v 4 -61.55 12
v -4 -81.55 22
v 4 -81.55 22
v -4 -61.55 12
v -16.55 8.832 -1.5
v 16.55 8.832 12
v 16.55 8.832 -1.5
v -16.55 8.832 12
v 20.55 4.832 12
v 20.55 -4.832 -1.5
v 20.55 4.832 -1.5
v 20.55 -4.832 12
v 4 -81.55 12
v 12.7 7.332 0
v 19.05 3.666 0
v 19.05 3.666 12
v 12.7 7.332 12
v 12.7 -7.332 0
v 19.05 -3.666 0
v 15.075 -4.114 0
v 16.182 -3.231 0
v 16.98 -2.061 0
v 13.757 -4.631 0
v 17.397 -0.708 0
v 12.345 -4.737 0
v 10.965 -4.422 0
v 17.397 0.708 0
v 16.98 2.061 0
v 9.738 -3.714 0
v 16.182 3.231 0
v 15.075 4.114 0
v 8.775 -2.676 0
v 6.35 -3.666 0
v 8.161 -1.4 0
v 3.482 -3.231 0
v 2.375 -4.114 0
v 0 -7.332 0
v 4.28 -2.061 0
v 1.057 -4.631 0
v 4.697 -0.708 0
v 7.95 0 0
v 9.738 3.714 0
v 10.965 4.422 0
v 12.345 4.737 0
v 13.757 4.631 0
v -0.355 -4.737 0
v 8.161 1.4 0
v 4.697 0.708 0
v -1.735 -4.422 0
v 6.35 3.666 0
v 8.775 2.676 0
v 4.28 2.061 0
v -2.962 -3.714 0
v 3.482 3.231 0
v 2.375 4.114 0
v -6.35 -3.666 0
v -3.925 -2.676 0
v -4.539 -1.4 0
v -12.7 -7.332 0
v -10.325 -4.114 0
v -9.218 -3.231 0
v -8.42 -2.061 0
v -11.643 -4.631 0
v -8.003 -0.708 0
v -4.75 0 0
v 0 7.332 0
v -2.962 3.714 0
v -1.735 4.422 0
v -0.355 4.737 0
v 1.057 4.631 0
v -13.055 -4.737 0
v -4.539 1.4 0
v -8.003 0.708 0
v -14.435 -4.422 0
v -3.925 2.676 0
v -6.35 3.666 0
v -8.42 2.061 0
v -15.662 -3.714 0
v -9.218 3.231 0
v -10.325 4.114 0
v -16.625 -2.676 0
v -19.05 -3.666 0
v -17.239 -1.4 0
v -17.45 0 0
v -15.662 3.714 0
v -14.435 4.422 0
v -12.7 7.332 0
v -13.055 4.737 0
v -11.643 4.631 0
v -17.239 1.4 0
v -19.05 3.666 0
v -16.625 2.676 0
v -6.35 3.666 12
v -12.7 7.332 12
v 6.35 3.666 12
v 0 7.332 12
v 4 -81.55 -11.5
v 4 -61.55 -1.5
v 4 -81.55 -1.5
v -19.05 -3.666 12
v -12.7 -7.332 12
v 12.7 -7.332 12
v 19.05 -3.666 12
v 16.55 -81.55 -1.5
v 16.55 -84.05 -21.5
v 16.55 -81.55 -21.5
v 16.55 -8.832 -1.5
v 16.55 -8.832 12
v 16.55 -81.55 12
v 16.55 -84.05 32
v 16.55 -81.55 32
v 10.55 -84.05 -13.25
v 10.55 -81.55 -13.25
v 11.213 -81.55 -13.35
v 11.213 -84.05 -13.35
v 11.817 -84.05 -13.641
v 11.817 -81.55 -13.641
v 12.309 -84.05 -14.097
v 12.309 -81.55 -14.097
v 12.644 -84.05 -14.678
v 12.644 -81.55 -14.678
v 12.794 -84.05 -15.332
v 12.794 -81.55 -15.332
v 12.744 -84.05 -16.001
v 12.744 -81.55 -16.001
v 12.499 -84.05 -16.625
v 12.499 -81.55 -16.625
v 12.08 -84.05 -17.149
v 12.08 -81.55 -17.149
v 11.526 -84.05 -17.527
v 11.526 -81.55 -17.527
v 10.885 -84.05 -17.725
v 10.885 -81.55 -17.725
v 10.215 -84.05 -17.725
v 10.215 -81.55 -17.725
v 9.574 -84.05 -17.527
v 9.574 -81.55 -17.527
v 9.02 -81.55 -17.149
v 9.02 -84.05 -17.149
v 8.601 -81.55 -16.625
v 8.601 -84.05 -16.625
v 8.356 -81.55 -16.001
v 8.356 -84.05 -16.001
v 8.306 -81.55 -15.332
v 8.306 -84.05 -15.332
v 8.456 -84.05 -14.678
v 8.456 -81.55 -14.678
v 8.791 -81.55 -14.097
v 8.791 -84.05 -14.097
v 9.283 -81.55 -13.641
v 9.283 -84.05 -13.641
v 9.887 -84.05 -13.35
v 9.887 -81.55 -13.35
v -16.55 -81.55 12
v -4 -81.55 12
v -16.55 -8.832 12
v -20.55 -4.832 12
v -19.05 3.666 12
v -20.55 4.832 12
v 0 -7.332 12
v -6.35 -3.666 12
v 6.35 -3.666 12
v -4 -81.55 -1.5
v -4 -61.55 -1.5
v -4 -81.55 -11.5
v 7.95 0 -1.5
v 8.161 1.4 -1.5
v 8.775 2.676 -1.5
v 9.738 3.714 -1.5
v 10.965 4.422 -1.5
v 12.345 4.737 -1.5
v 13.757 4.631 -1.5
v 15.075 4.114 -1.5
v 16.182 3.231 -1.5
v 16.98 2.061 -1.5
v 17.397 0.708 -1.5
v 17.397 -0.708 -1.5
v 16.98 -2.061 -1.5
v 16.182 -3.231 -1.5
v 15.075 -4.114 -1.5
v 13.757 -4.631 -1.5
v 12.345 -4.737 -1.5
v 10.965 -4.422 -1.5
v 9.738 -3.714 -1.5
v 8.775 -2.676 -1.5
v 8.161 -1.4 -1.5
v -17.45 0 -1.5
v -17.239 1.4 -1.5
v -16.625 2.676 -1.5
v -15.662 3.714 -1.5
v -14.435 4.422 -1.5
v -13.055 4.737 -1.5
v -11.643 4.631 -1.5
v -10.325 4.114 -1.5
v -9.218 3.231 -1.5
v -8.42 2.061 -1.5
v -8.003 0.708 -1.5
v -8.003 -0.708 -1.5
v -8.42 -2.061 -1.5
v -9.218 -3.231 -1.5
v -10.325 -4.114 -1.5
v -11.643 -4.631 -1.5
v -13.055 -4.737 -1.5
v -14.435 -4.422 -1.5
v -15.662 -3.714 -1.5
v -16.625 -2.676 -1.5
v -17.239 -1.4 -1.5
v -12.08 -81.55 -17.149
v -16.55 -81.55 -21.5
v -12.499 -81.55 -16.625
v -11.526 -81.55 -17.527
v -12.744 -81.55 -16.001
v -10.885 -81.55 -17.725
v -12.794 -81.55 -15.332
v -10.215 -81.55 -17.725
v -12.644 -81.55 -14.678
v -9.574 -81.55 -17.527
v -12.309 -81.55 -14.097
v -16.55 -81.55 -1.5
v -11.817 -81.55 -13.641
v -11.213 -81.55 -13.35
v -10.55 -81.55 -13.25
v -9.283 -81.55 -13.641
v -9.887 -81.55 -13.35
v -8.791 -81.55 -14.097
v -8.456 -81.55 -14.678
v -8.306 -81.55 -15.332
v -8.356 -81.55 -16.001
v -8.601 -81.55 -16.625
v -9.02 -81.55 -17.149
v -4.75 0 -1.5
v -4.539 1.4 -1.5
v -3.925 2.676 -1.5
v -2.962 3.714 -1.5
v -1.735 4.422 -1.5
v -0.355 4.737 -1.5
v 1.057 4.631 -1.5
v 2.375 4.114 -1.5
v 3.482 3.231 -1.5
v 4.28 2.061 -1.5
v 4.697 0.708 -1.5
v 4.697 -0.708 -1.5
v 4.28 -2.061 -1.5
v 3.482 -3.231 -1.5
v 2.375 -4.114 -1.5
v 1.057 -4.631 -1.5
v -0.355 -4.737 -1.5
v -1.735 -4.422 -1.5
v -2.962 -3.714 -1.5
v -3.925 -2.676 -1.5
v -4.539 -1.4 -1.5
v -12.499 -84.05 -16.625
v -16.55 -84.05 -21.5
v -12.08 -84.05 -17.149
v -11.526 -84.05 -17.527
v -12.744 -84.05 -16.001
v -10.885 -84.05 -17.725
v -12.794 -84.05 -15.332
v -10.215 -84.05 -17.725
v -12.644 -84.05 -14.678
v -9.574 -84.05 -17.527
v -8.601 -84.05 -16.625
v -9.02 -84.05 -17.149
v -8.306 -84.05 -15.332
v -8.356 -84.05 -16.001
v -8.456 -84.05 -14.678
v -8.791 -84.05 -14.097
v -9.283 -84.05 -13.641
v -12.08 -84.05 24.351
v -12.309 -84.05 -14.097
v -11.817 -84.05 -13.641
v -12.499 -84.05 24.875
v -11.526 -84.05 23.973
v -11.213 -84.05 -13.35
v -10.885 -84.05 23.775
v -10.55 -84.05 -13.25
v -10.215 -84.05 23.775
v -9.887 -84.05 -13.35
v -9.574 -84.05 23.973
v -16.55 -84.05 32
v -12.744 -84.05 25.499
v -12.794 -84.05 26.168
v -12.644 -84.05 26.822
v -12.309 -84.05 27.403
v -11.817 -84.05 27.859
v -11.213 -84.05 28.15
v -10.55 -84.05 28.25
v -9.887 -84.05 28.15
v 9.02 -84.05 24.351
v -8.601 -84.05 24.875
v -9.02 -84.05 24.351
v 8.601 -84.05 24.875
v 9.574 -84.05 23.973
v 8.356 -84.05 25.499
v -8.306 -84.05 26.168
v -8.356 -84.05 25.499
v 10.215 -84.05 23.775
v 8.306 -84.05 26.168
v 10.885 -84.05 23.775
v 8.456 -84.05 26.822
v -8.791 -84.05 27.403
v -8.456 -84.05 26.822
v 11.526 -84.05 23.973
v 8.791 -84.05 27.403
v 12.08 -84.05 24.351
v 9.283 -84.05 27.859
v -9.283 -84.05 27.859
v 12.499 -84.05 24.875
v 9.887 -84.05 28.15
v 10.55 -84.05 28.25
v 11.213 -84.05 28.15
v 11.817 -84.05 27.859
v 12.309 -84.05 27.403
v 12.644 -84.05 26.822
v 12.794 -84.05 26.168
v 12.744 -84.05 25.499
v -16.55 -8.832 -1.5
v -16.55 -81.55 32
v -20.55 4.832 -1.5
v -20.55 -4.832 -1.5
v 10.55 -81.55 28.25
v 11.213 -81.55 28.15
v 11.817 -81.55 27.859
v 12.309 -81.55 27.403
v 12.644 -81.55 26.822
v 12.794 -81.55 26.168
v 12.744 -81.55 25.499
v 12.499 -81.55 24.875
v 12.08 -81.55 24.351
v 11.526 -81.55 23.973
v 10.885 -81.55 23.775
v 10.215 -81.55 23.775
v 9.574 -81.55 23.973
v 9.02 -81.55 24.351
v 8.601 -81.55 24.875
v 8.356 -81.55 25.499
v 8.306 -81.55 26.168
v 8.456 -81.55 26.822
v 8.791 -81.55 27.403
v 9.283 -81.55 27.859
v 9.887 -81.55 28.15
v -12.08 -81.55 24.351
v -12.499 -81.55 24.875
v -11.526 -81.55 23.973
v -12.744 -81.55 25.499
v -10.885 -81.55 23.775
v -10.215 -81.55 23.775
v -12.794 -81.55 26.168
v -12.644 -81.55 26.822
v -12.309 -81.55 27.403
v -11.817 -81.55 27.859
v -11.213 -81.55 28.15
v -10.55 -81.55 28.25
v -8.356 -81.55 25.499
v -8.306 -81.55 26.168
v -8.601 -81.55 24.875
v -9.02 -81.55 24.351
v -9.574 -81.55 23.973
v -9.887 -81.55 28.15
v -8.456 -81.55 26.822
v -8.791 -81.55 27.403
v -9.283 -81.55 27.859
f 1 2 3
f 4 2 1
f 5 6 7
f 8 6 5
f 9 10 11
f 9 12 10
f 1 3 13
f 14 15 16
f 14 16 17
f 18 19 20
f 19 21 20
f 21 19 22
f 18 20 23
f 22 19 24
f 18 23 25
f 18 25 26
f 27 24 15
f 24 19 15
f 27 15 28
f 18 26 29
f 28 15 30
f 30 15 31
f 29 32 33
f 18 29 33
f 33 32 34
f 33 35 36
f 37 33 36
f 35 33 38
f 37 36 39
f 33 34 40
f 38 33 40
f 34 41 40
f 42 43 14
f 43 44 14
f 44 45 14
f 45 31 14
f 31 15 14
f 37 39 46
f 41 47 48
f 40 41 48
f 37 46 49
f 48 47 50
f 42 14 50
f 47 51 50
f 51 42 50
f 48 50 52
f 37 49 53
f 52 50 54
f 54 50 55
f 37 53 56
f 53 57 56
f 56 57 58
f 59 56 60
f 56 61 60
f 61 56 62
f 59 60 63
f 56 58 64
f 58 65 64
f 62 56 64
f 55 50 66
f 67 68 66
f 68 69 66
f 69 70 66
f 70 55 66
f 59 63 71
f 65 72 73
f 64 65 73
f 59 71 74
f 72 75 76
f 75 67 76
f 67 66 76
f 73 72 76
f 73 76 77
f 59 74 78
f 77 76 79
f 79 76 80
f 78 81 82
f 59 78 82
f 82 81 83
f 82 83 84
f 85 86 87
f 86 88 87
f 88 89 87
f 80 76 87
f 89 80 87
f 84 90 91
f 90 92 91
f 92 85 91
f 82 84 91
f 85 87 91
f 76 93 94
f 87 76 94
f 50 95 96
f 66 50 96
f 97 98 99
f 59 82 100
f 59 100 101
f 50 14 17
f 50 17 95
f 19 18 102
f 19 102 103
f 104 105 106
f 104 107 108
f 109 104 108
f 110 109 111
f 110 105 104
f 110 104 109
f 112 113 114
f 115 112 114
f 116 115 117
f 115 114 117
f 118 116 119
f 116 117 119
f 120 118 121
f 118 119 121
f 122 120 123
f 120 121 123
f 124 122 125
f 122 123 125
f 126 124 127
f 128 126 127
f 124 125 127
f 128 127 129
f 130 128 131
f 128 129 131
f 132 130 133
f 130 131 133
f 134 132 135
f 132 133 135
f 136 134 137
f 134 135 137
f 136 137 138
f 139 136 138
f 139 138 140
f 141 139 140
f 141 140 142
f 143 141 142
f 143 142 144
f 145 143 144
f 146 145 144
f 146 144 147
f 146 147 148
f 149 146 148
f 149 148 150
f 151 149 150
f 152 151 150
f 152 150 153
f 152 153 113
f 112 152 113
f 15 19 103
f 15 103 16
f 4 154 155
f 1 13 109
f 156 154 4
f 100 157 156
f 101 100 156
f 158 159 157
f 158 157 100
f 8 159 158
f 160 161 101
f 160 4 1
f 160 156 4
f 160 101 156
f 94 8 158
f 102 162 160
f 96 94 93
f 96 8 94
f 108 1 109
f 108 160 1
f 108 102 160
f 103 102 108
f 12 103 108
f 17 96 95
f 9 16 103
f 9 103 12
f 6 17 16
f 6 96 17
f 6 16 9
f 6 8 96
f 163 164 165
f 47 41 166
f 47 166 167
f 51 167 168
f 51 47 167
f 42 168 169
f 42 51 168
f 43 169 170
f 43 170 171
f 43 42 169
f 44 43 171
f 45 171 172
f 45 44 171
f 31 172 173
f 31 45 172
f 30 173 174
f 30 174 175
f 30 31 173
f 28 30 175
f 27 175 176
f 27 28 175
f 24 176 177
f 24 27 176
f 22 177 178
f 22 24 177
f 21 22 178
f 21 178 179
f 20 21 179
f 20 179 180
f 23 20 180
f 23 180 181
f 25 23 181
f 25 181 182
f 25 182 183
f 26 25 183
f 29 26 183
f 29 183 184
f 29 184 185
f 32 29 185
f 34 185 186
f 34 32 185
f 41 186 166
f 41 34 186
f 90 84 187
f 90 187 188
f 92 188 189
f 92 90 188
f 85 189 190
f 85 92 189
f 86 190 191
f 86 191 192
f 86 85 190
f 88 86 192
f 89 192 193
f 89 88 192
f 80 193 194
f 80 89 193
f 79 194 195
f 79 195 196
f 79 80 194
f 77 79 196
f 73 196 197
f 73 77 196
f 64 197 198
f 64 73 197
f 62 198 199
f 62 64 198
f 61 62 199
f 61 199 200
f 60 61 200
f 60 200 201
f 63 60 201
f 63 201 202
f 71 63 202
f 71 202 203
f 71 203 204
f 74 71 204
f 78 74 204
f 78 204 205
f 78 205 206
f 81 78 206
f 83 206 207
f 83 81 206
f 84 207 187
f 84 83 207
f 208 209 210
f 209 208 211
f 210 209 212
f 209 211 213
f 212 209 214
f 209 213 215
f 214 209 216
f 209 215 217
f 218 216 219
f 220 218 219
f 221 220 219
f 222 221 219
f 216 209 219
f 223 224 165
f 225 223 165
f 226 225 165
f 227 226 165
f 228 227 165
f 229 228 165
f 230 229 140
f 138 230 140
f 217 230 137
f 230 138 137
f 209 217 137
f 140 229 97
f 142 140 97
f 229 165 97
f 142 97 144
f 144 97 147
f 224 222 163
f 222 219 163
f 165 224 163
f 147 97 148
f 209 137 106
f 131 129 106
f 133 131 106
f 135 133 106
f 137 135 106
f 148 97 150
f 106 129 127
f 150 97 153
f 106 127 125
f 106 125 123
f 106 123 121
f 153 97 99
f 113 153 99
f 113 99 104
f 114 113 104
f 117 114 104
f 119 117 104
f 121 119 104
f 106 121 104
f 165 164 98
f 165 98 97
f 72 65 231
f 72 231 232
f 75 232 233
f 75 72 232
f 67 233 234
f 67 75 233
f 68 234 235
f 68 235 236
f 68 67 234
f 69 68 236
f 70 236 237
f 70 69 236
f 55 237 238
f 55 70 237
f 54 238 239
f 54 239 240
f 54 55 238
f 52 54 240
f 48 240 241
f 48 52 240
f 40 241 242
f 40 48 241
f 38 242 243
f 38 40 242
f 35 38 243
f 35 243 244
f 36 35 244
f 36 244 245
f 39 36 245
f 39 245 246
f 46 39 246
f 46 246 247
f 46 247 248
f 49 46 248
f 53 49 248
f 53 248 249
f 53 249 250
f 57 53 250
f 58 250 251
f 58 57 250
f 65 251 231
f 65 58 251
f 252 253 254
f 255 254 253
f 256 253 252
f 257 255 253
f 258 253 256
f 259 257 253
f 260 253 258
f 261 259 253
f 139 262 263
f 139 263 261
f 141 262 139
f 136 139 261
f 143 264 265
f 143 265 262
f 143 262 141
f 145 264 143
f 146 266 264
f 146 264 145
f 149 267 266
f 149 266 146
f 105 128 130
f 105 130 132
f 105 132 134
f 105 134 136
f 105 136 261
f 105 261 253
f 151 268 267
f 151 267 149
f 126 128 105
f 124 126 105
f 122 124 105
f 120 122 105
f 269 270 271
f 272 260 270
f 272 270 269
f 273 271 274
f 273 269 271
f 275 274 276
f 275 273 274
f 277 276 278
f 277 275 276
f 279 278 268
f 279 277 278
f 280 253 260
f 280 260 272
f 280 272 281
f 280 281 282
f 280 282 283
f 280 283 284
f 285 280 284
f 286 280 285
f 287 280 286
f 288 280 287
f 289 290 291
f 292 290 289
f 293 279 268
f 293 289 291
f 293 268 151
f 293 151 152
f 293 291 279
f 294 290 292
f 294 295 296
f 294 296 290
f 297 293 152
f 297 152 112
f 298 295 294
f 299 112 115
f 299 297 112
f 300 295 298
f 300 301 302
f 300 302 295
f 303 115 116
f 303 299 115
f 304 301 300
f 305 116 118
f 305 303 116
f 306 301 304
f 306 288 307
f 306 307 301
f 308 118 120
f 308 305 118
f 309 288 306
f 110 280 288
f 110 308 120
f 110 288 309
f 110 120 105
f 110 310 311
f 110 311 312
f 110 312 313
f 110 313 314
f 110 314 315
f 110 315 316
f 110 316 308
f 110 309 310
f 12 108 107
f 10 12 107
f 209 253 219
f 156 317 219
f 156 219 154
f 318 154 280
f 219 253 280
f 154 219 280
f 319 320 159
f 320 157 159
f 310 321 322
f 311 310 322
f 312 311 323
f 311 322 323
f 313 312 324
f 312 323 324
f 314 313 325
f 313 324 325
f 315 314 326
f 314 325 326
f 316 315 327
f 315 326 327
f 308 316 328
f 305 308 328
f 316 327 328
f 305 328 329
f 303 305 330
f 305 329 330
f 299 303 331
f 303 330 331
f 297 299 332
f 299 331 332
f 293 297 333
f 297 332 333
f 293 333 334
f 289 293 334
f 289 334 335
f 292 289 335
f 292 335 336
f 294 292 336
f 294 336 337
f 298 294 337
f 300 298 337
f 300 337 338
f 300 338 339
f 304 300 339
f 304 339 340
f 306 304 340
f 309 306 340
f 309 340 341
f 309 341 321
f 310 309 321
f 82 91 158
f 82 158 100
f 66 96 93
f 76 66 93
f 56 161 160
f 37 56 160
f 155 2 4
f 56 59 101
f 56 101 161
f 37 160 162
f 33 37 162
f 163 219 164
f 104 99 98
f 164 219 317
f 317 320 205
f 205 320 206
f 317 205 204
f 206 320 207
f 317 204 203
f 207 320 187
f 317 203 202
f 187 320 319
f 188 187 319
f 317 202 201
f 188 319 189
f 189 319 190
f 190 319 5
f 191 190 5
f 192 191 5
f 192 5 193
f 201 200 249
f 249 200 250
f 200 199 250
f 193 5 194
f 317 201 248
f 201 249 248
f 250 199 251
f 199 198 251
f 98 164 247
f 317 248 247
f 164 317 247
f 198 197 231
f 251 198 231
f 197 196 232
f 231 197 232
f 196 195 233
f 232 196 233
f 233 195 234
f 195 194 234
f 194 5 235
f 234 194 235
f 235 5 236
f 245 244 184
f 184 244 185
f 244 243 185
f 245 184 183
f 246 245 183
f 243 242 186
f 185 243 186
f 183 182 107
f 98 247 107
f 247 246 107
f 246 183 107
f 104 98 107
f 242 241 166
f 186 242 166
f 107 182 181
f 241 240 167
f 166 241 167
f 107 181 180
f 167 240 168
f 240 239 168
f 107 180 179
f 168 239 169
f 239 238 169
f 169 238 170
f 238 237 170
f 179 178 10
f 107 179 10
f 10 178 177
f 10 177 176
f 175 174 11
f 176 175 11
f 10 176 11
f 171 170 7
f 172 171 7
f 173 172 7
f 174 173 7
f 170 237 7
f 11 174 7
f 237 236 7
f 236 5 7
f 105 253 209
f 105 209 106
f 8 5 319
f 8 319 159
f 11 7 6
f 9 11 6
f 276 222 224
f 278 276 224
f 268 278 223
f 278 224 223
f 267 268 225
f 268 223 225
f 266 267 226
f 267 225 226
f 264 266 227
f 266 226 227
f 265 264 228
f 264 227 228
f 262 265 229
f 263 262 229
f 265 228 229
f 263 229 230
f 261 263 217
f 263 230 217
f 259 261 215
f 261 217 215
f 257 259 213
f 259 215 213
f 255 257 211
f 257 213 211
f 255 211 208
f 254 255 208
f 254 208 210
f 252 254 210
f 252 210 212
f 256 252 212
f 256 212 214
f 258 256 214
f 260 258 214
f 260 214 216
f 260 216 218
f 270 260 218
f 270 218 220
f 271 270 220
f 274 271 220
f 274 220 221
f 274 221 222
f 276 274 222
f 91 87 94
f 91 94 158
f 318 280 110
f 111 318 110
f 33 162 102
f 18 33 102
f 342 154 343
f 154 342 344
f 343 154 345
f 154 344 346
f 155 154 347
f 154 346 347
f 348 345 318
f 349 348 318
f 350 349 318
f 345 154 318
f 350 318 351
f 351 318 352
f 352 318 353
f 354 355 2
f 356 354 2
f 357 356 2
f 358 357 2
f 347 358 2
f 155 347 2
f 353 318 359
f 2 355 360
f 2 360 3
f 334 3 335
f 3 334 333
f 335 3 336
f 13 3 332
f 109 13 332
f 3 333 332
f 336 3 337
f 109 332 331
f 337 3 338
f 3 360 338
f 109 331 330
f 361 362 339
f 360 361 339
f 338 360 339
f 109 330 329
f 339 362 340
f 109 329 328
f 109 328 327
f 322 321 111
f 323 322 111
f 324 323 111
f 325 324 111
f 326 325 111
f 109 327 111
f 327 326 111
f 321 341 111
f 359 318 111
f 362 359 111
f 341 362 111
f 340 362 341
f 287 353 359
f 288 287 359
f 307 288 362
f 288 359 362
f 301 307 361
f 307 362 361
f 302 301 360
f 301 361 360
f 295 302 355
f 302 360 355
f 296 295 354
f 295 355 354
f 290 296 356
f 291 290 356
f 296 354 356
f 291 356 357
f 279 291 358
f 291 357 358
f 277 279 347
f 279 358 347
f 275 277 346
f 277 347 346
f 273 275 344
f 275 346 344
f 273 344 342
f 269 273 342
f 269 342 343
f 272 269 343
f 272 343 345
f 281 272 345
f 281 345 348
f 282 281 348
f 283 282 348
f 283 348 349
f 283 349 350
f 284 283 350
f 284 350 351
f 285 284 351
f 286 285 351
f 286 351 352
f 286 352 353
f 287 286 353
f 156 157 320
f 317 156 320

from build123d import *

# Parameters (mm, degrees)
SKETCH1_W           = 41.1
SKETCH1_H           = 17.664696838
BOSS_EXTRUDE1_DEPTH = 12
SKETCH2_W           = 41.1
SKETCH2_H           = 17.664696838
SKETCH2_R           = 4.75
BOSS_EXTRUDE2_DEPTH = 1.5
CHAMFER2_SIZE       = 4
SKETCH3_W           = 33.1
SKETCH3_H           = 13.5
BOSS_EXTRUDE3_DEPTH = 75.2176516
SKETCH4_W           = 33.1
SKETCH4_H           = 20
BOSS_EXTRUDE4_DEPTH = 2.5
CUT_EXTRUDE1_REACH  = 100.057
SKETCH5_R           = 2.25
RIB1_REACH          = 94.253
SKETCH6_WALL_W      = 208.867644448
SKETCH6_WALL_H      = 8
RIB2_REACH          = 94.253
SKETCH7_WALL_W      = 208.867644448
SKETCH7_WALL_H      = 8


with BuildPart() as part:
    # Sketch1 → Boss-Extrude1 (new body)
    with BuildSketch(Plane.XY):
        Rectangle(SKETCH1_W, SKETCH1_H)
        Polygon((-12.7, -7.332348419), (-6.35, -3.666174209), (0, -7.332348419), (6.35, -3.666174209), (12.7, -7.332348419), (19.05, -3.666174209), (19.05, 3.666174209), (12.7, 7.332348419), (6.35, 3.666174209), (0, 7.332348419), (-6.35, 3.666174209), (-12.7, 7.332348419), (-19.05, 3.666174209), (-19.05, -3.666174209), align=None, mode=Mode.SUBTRACT)
    extrude(amount=BOSS_EXTRUDE1_DEPTH)

    # Sketch2 → Boss-Extrude2 (add)
    with BuildSketch(Plane(origin=(0, 0, 0), x_dir=(-1, 0, 0), z_dir=(0, 0, -1))):
        Rectangle(SKETCH2_W, SKETCH2_H)
        Polygon((19.05, -3.666174209), (12.7, -7.332348419), (6.35, -3.666174209), (0, -7.332348419), (-6.35, -3.666174209), (-12.7, -7.332348419), (-19.05, -3.666174209), (-19.05, 3.666174209), (-12.7, 7.332348419), (-6.35, 3.666174209), (0, 7.332348419), (6.35, 3.666174209), (12.7, 7.332348419), (19.05, 3.666174209), align=None, mode=Mode.SUBTRACT)
        Polygon((6.35, -3.666174209), (6.35, 3.666174209), (12.7, 7.332348419), (19.05, 3.666174209), (19.05, -3.666174209), (12.7, -7.332348419), align=None)
        with Locations((12.7, 0)):
            Circle(SKETCH2_R, mode=Mode.SUBTRACT)
        Polygon((6.35, -3.666174209), (6.35, 3.666174209), (0, 7.332348419), (-6.35, 3.666174209), (-6.35, -3.666174209), (0, -7.332348419), align=None)
        Circle(SKETCH2_R, mode=Mode.SUBTRACT)
        Polygon((-6.35, 3.666174209), (-6.35, -3.666174209), (-12.7, -7.332348419), (-19.05, -3.666174209), (-19.05, 3.666174209), (-12.7, 7.332348419), align=None)
        with Locations((-12.7, 0)):
            Circle(SKETCH2_R, mode=Mode.SUBTRACT)
    extrude(amount=BOSS_EXTRUDE2_DEPTH)

    # Chamfer2
    chamfer2_edges = [part.edges().sort_by_distance(p)[0] for p in [
        (-20.55, -8.832348419, 5.25),
        (-20.55, 8.832348419, 5.25),
        (20.55, 8.832348419, 5.25),
        (20.55, -8.832348419, 5.25),
    ]]
    chamfer(chamfer2_edges, length=CHAMFER2_SIZE)

    # Sketch3 → Boss-Extrude3 (add)
    with BuildSketch(Plane.XZ.offset(8.832348419)):
        with Locations((0, 5.25)):
            Rectangle(SKETCH3_W, SKETCH3_H)
    extrude(amount=BOSS_EXTRUDE3_DEPTH)

    # Sketch4 → Boss-Extrude4 (add)
    with BuildSketch(Plane.XZ.offset(84.050000019)):
        with Locations((0, 22)):
            Rectangle(SKETCH4_W, SKETCH4_H)
        with Locations((0, -11.5)):
            Rectangle(SKETCH4_W, SKETCH4_H)
    extrude(amount=-BOSS_EXTRUDE4_DEPTH)

    # Sketch5 → Cut-Extrude1 (cut, up to next)
    with BuildSketch(Plane(origin=(0, -81.550000019, 0), x_dir=(1, 0, 0), z_dir=(0, 1, 0)), mode=Mode.PRIVATE) as cut_extrude1_sk1:
        with Locations(Location((-10.55, -26, 0), (0, 0, 270))):
            Circle(SKETCH5_R)
    cut_extrude1_tool1 = extrude(cut_extrude1_sk1.sketch, amount=-CUT_EXTRUDE1_REACH, mode=Mode.PRIVATE) & part.part
    # Sketch5 → Cut-Extrude1 (cut, up to next)
    with BuildSketch(Plane(origin=(0, -81.550000019, 0), x_dir=(1, 0, 0), z_dir=(0, 1, 0)), mode=Mode.PRIVATE) as cut_extrude1_sk2:
        with Locations(Location((10.55, -26, 0), (0, 0, 270))):
            Circle(SKETCH5_R)
    cut_extrude1_tool2 = extrude(cut_extrude1_sk2.sketch, amount=-CUT_EXTRUDE1_REACH, mode=Mode.PRIVATE) & part.part
    # Sketch5 → Cut-Extrude1 (cut, up to next)
    with BuildSketch(Plane(origin=(0, -81.550000019, 0), x_dir=(1, 0, 0), z_dir=(0, 1, 0)), mode=Mode.PRIVATE) as cut_extrude1_sk3:
        with Locations(Location((10.55, 15.5, 0), (0, 0, 270))):
            Circle(SKETCH5_R)
    cut_extrude1_tool3 = extrude(cut_extrude1_sk3.sketch, amount=-CUT_EXTRUDE1_REACH, mode=Mode.PRIVATE) & part.part
    # Sketch5 → Cut-Extrude1 (cut, up to next)
    with BuildSketch(Plane(origin=(0, -81.550000019, 0), x_dir=(1, 0, 0), z_dir=(0, 1, 0)), mode=Mode.PRIVATE) as cut_extrude1_sk4:
        with Locations(Location((-10.55, 15.5, 0), (0, 0, 270))):
            Circle(SKETCH5_R)
    cut_extrude1_tool4 = extrude(cut_extrude1_sk4.sketch, amount=-CUT_EXTRUDE1_REACH, mode=Mode.PRIVATE) & part.part
    add(cut_extrude1_tool1.solids().sort_by_distance((-10.55, -81.55, 26))[0], mode=Mode.SUBTRACT)
    add(cut_extrude1_tool2.solids().sort_by_distance((10.55, -81.55, 26))[0], mode=Mode.SUBTRACT)
    add(cut_extrude1_tool3.solids().sort_by_distance((10.55, -81.55, -15.5))[0], mode=Mode.SUBTRACT)
    add(cut_extrude1_tool4.solids().sort_by_distance((-10.55, -81.55, -15.5))[0], mode=Mode.SUBTRACT)

    # Sketch6 wall → Rib1 (add, up to next)
    with BuildSketch(Plane(origin=(0, -71.550000019, 17), x_dir=(0, 0.894427191, -0.4472135955), z_dir=(0, 0.4472135955, 0.894427191)), mode=Mode.PRIVATE) as rib1_sk1:
        Rectangle(SKETCH6_WALL_W, SKETCH6_WALL_H)
    rib1_tool1 = extrude(rib1_sk1.sketch, amount=-RIB1_REACH, mode=Mode.PRIVATE) - part.part
    add(rib1_tool1.solids().sort_by_distance((0, -71.550000019, 17))[0])

    # Sketch7 wall → Rib2 (add, up to next)
    with BuildSketch(Plane(origin=(0, -71.550000019, -6.5), x_dir=(0, -0.894427191, -0.4472135955), z_dir=(0, 0.4472135955, -0.894427191)), mode=Mode.PRIVATE) as rib2_sk1:
        Rectangle(SKETCH7_WALL_W, SKETCH7_WALL_H)
    rib2_tool1 = extrude(rib2_sk1.sketch, amount=-RIB2_REACH, mode=Mode.PRIVATE) - part.part
    add(rib2_tool1.solids().sort_by_distance((0, -71.550000019, -6.5))[0])


solid = part.part
